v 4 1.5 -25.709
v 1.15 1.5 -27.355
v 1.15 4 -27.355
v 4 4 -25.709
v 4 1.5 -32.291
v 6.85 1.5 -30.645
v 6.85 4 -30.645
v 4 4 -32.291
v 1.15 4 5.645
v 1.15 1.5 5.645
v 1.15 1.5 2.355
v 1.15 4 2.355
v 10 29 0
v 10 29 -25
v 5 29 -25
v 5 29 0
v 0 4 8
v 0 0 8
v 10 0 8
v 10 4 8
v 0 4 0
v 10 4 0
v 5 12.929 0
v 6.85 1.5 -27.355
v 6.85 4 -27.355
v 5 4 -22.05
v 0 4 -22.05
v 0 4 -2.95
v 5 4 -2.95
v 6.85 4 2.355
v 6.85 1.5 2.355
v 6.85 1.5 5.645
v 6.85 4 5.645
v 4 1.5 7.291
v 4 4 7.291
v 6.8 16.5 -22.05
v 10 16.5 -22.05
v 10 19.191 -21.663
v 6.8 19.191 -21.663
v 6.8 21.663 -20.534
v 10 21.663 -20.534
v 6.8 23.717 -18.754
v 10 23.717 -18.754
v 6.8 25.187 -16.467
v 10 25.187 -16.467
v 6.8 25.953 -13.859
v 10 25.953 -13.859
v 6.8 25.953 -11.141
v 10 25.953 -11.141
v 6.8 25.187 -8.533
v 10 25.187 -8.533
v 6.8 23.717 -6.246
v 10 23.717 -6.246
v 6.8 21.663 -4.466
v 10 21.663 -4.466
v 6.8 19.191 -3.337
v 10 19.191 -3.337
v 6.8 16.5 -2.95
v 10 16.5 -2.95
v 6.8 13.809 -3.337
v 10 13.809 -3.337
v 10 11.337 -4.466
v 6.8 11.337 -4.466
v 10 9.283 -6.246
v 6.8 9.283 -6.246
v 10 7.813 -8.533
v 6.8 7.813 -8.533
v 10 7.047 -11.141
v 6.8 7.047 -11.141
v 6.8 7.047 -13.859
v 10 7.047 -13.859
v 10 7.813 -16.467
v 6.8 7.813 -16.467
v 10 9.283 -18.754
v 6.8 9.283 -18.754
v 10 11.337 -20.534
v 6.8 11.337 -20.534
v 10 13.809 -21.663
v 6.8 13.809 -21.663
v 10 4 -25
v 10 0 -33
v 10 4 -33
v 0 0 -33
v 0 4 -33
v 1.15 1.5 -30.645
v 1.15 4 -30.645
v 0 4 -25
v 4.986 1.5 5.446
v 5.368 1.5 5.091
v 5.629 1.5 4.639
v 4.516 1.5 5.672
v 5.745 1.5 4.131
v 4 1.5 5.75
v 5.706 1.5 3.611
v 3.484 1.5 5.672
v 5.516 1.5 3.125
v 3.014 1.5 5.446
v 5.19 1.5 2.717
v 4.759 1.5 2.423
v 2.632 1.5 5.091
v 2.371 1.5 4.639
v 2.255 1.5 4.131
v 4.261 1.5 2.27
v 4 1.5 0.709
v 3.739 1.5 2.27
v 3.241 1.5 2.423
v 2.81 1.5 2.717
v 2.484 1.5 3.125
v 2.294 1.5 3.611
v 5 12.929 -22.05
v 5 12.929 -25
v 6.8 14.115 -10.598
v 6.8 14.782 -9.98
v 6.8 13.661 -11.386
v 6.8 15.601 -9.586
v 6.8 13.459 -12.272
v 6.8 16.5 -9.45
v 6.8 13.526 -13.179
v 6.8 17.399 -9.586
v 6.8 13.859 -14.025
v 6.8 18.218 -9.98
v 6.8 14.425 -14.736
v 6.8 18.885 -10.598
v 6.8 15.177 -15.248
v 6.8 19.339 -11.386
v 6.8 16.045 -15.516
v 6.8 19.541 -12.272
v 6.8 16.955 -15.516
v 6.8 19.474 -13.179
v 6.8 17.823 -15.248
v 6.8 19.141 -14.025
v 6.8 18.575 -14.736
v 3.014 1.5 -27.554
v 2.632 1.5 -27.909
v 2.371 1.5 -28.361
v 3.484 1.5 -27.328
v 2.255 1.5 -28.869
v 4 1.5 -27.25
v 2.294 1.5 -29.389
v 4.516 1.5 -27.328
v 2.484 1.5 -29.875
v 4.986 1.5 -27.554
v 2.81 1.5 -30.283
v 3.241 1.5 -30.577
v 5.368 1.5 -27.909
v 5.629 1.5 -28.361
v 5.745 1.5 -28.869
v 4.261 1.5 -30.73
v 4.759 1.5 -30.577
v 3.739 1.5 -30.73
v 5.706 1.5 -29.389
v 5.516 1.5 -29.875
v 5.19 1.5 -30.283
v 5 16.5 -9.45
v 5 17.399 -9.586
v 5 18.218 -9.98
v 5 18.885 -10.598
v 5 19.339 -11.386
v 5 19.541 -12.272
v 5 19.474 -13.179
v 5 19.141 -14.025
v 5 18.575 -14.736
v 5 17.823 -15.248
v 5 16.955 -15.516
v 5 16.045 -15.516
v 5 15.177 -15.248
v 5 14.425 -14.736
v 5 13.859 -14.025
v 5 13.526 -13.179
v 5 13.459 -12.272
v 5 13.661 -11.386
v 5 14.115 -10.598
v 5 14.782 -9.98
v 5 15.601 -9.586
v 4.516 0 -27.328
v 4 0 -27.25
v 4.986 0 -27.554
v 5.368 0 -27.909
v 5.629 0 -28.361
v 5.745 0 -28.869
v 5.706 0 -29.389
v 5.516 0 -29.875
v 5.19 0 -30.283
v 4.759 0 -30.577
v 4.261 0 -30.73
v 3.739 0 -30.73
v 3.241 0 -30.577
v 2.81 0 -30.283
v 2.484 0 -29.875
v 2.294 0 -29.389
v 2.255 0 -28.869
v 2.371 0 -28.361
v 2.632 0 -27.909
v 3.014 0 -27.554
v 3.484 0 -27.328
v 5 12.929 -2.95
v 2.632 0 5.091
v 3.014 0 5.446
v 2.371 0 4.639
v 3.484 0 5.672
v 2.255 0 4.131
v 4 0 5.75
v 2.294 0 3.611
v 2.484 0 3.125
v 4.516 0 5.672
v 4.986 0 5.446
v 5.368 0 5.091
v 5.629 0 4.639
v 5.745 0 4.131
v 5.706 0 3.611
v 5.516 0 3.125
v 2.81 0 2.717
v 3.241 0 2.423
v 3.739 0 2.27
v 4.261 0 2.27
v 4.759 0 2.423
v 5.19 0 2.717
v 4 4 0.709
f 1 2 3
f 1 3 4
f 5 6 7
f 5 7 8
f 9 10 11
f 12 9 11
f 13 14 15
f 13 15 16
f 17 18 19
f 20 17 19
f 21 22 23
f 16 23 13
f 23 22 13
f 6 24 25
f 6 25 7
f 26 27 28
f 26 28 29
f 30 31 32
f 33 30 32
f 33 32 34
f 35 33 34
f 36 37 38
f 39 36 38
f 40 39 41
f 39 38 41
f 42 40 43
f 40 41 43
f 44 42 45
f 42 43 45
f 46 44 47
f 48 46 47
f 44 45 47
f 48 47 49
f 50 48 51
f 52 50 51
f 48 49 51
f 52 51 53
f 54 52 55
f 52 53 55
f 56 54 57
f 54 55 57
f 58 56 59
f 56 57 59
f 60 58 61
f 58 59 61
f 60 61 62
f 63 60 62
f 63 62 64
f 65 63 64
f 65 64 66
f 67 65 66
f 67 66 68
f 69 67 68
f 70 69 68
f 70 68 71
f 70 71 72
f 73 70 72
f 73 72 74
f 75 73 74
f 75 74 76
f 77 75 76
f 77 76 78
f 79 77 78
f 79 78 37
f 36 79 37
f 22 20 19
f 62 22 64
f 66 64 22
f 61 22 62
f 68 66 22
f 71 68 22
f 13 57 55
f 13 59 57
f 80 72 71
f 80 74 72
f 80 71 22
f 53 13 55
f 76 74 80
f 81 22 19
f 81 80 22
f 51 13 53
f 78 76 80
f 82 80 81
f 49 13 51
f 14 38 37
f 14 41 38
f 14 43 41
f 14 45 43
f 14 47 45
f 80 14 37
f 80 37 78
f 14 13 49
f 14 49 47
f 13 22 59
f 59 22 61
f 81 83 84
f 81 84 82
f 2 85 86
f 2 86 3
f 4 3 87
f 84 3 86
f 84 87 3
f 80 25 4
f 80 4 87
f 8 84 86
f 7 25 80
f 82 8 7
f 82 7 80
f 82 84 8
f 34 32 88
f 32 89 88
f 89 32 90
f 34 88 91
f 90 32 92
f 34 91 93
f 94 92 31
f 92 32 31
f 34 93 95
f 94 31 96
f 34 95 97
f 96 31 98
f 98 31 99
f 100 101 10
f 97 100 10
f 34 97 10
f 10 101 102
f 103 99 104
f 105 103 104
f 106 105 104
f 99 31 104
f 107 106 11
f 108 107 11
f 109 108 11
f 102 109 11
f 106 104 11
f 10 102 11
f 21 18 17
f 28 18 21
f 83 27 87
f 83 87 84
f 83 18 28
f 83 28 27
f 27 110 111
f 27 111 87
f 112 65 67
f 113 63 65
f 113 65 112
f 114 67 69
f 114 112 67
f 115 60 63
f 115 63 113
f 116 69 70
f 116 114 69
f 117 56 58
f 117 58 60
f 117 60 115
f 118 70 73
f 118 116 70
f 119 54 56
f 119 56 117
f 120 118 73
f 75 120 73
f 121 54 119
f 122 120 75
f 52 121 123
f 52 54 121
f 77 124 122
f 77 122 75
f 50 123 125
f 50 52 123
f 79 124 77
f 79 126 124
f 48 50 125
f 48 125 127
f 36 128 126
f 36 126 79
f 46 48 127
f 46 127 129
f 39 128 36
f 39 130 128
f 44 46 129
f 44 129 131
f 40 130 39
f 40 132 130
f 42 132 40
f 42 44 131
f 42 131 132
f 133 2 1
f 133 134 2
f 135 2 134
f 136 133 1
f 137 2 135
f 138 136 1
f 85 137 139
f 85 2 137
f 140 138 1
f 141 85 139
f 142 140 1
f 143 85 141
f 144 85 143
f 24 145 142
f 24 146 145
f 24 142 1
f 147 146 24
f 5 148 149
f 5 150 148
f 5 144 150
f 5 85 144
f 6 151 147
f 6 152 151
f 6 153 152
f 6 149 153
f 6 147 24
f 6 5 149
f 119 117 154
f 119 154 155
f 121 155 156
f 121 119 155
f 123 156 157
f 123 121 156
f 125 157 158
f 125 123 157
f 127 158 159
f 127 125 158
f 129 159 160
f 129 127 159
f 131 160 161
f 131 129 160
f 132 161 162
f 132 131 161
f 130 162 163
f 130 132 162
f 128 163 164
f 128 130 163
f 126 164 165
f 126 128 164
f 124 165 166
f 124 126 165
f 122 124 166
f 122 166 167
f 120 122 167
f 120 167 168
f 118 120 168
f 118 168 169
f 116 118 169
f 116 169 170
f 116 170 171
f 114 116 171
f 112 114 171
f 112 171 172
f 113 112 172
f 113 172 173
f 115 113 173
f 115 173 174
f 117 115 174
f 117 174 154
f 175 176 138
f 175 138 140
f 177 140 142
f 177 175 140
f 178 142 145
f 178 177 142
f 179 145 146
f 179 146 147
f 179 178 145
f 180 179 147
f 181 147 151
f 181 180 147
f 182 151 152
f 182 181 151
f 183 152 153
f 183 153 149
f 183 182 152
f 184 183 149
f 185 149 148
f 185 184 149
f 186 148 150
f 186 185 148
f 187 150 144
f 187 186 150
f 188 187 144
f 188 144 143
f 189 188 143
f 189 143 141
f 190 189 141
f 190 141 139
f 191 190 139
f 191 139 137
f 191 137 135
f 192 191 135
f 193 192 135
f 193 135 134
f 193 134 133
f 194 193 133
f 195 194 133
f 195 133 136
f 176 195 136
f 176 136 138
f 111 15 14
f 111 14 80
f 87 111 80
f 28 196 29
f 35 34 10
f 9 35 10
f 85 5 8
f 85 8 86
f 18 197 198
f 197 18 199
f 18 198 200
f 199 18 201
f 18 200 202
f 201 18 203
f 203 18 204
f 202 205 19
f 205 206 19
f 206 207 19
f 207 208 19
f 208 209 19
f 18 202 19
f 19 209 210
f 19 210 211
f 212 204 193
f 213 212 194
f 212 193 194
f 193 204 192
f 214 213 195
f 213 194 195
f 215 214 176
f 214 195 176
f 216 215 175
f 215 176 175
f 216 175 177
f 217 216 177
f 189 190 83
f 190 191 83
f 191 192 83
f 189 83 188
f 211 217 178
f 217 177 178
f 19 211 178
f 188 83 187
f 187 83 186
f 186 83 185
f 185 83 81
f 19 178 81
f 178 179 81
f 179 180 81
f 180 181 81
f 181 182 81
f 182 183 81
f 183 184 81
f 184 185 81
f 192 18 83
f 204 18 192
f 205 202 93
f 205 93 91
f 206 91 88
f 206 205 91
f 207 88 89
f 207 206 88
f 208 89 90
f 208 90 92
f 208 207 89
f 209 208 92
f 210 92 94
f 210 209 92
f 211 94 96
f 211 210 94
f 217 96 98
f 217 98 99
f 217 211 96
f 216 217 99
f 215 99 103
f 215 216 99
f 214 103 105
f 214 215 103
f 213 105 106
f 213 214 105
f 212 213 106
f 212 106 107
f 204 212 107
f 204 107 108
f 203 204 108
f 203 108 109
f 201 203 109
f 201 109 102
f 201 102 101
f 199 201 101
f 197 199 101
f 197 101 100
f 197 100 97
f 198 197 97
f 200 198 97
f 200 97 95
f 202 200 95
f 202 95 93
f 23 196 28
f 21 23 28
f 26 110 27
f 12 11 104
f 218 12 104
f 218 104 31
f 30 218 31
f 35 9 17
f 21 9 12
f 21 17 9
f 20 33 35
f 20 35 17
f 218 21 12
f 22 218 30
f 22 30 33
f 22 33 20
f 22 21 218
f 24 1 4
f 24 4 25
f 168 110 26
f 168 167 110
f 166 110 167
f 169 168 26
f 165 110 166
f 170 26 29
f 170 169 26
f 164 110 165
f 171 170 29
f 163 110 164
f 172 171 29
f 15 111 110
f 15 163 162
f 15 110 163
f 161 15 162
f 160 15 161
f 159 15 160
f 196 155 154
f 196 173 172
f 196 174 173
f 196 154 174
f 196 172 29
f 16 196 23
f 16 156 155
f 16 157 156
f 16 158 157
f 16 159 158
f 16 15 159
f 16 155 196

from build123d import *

# Parameters (mm, degrees)
SKETCH1_W           = 20
SKETCH1_H           = 41
SKETCH1_W_2         = 6
SKETCH1_H_2         = 25
SKETCH1_R           = 1.75
BOSS_EXTRUDE1_DEPTH = 4
SKETCH1_3_W         = 6
SKETCH1_3_H         = 25
SKETCH1_3_H_2       = 12.5
BOSS_EXTRUDE2_DEPTH = 29
SKETCH2_R           = 9.55
CUT_EXTRUDE1_DEPTH  = 29
RIB1_REACH          = 50.27
SKETCH3_WALL_W      = 112.866695872
SKETCH3_WALL_H      = 2.95
RIB7_REACH          = 50.27
SKETCH4_WALL_W      = 112.866695872
SKETCH4_WALL_H      = 2.95
CUT_EXTRUDE4_START  = 1.5
SKETCH1_4_R         = 1.75
CUT_EXTRUDE4_DEPTH  = 2.5
SKETCH5_W           = 25
SKETCH5_H           = 25
SKETCH5_R           = 3.05
BOSS_EXTRUDE3_DEPTH = 2
SKETCH6_R           = 9.55
CUT_EXTRUDE5_DEPTH  = 0.2


with BuildPart() as part:
    # Sketch1 → Boss-Extrude1 (new body)
    with BuildSketch(Plane(origin=(0, 0, 0), x_dir=(1, 0, 0), z_dir=(0, 1, 0))):
        with Locations((10, 12.5)):
            Rectangle(SKETCH1_W, SKETCH1_H)
        with Locations((10, 12.5)):
            Rectangle(SKETCH1_W_2, SKETCH1_H_2, mode=Mode.SUBTRACT)
        with Locations(Location((4, -4, 0), (0, 0, 270))):
            Circle(SKETCH1_R, mode=Mode.SUBTRACT)
        with Locations(Location((4, 29, 0), (0, 0, 270))):
            Circle(SKETCH1_R, mode=Mode.SUBTRACT)
        with Locations(Location((16, -4, 0), (0, 0, 270))):
            Circle(SKETCH1_R, mode=Mode.SUBTRACT)
        with Locations(Location((16, 29, 0), (0, 0, 270))):
            Circle(SKETCH1_R, mode=Mode.SUBTRACT)
    extrude(amount=BOSS_EXTRUDE1_DEPTH)

    # Sketch1<3> → Boss-Extrude2 (add)
    with BuildSketch(Plane(origin=(0, 0, 0), x_dir=(1, 0, 0), z_dir=(0, 1, 0))):
        with Locations((10, 12.5)):
            Rectangle(SKETCH1_3_W, SKETCH1_3_H)
        with Locations((10, 18.75)):
            Rectangle(SKETCH1_3_W, SKETCH1_3_H_2)
    extrude(amount=BOSS_EXTRUDE2_DEPTH)

    # Sketch2 → Cut-Extrude1 (cut)
    with BuildSketch(Plane(origin=(13, 0, 0), x_dir=(0, 0, -1), z_dir=(1, 0, 0))):
        with Locations((12.5, 16.5)):
            Circle(SKETCH2_R)
    extrude(amount=-CUT_EXTRUDE1_DEPTH, mode=Mode.SUBTRACT)

    # Sketch3 wall → Rib1 (add, up to next)
    with BuildSketch(Plane(origin=(16.5, 10.25, 0), x_dir=(0.488603368932, -0.87250601595, 0), z_dir=(0.87250601595, 0.488603368932, 0)), mode=Mode.PRIVATE) as rib1_sk1:
        with Locations((0, 1.475)):
            Rectangle(SKETCH3_WALL_W, SKETCH3_WALL_H)
    rib1_tool1 = extrude(rib1_sk1.sketch, amount=-RIB1_REACH, mode=Mode.PRIVATE) - part.part
    rib1 = rib1_tool1.solids().sort_by_distance((16.5, 10.25, 0))[0]
    add(rib1)

    # Sketch4 wall → Rib7 (add, up to next)
    with BuildSketch(Plane(origin=(3.5, 10.25, 0), x_dir=(-0.488603368932, -0.87250601595, 0), z_dir=(0.87250601595, -0.488603368932, 0)), mode=Mode.PRIVATE) as rib7_sk1:
        with Locations((0, 1.475)):
            Rectangle(SKETCH4_WALL_W, SKETCH4_WALL_H)
    rib7_tool1 = extrude(rib7_sk1.sketch, amount=RIB7_REACH, mode=Mode.PRIVATE) - part.part
    rib7 = rib7_tool1.solids().sort_by_distance((3.5, 10.25, 0))[0]
    add(rib7)

    # Mirror1: Rib1, Rib7 across plane
    add(rib1.mirror(Plane.XY.offset(-12.5)))
    add(rib7.mirror(Plane.XY.offset(-12.5)))

    # Sketch1<4> → Cut-Extrude4 (cut)
    # profile 1 of 4: a face of its own
    with BuildSketch(Plane(origin=(0, 0, 0), x_dir=(1, 0, 0), z_dir=(0, 1, 0)).offset(CUT_EXTRUDE4_START)):
        Polygon((4, -0.709103466), (6.85, -2.354551733), (6.85, -5.645448267), (4, -7.290896534), (1.15, -5.645448267), (1.15, -2.354551733), align=None)
        with Locations(Location((4, -4, 0), (0, 0, 270))):
            Circle(SKETCH1_4_R, mode=Mode.SUBTRACT)
    # profile 2 of 4: a face of its own
    with BuildSketch(Plane(origin=(0, 0, 0), x_dir=(1, 0, 0), z_dir=(0, 1, 0)).offset(CUT_EXTRUDE4_START)):
        Polygon((1.15, 30.645448267), (1.15, 27.354551733), (4, 25.709103466), (6.85, 27.354551733), (6.85, 30.645448267), (4, 32.290896534), align=None)
        with Locations(Location((4, 29, 0), (0, 0, 270))):
            Circle(SKETCH1_4_R, mode=Mode.SUBTRACT)
    # profile 3 of 4: a face of its own
    with BuildSketch(Plane(origin=(0, 0, 0), x_dir=(1, 0, 0), z_dir=(0, 1, 0)).offset(CUT_EXTRUDE4_START)):
        Polygon((16, 25.709103466), (13.15, 27.354551733), (13.15, 30.645448267), (16, 32.290896534), (18.85, 30.645448267), (18.85, 27.354551733), align=None)
        with Locations(Location((16, 29, 0), (0, 0, 270))):
            Circle(SKETCH1_4_R, mode=Mode.SUBTRACT)
    # profile 4 of 4: a face of its own
    with BuildSketch(Plane(origin=(0, 0, 0), x_dir=(1, 0, 0), z_dir=(0, 1, 0)).offset(CUT_EXTRUDE4_START)):
        Polygon((18.85, -5.645448267), (18.85, -2.354551733), (16, -0.709103466), (13.15, -2.354551733), (13.15, -5.645448267), (16, -7.290896534), align=None)
        with Locations(Location((16, -4, 0), (0, 0, 270))):
            Circle(SKETCH1_4_R, mode=Mode.SUBTRACT)
    extrude(amount=CUT_EXTRUDE4_DEPTH, mode=Mode.SUBTRACT)

    # Sketch5 → Boss-Extrude3 (add)
    with BuildSketch(Plane.ZY.offset(-7)):
        with Locations((-12.5, 16.5)):
            Rectangle(SKETCH5_W, SKETCH5_H)
        with Locations((-12.5, 16.5)):
            Circle(SKETCH5_R, mode=Mode.SUBTRACT)
    extrude(amount=BOSS_EXTRUDE3_DEPTH)

    # SurfaceCut1
    split(bisect_by=Plane(origin=(10, 0, 0), x_dir=(0, 0, -1), z_dir=(1, 0, 0)), keep=Keep.BOTTOM)

    # Sketch6 → Cut-Extrude5 (cut)
    with BuildSketch(Plane(origin=(7, 0, 0), x_dir=(0, 0, -1), z_dir=(1, 0, 0))):
        with Locations((12.5, 16.5)):
            Circle(SKETCH6_R)
    extrude(amount=-CUT_EXTRUDE5_DEPTH, mode=Mode.SUBTRACT)


solid = part.part
